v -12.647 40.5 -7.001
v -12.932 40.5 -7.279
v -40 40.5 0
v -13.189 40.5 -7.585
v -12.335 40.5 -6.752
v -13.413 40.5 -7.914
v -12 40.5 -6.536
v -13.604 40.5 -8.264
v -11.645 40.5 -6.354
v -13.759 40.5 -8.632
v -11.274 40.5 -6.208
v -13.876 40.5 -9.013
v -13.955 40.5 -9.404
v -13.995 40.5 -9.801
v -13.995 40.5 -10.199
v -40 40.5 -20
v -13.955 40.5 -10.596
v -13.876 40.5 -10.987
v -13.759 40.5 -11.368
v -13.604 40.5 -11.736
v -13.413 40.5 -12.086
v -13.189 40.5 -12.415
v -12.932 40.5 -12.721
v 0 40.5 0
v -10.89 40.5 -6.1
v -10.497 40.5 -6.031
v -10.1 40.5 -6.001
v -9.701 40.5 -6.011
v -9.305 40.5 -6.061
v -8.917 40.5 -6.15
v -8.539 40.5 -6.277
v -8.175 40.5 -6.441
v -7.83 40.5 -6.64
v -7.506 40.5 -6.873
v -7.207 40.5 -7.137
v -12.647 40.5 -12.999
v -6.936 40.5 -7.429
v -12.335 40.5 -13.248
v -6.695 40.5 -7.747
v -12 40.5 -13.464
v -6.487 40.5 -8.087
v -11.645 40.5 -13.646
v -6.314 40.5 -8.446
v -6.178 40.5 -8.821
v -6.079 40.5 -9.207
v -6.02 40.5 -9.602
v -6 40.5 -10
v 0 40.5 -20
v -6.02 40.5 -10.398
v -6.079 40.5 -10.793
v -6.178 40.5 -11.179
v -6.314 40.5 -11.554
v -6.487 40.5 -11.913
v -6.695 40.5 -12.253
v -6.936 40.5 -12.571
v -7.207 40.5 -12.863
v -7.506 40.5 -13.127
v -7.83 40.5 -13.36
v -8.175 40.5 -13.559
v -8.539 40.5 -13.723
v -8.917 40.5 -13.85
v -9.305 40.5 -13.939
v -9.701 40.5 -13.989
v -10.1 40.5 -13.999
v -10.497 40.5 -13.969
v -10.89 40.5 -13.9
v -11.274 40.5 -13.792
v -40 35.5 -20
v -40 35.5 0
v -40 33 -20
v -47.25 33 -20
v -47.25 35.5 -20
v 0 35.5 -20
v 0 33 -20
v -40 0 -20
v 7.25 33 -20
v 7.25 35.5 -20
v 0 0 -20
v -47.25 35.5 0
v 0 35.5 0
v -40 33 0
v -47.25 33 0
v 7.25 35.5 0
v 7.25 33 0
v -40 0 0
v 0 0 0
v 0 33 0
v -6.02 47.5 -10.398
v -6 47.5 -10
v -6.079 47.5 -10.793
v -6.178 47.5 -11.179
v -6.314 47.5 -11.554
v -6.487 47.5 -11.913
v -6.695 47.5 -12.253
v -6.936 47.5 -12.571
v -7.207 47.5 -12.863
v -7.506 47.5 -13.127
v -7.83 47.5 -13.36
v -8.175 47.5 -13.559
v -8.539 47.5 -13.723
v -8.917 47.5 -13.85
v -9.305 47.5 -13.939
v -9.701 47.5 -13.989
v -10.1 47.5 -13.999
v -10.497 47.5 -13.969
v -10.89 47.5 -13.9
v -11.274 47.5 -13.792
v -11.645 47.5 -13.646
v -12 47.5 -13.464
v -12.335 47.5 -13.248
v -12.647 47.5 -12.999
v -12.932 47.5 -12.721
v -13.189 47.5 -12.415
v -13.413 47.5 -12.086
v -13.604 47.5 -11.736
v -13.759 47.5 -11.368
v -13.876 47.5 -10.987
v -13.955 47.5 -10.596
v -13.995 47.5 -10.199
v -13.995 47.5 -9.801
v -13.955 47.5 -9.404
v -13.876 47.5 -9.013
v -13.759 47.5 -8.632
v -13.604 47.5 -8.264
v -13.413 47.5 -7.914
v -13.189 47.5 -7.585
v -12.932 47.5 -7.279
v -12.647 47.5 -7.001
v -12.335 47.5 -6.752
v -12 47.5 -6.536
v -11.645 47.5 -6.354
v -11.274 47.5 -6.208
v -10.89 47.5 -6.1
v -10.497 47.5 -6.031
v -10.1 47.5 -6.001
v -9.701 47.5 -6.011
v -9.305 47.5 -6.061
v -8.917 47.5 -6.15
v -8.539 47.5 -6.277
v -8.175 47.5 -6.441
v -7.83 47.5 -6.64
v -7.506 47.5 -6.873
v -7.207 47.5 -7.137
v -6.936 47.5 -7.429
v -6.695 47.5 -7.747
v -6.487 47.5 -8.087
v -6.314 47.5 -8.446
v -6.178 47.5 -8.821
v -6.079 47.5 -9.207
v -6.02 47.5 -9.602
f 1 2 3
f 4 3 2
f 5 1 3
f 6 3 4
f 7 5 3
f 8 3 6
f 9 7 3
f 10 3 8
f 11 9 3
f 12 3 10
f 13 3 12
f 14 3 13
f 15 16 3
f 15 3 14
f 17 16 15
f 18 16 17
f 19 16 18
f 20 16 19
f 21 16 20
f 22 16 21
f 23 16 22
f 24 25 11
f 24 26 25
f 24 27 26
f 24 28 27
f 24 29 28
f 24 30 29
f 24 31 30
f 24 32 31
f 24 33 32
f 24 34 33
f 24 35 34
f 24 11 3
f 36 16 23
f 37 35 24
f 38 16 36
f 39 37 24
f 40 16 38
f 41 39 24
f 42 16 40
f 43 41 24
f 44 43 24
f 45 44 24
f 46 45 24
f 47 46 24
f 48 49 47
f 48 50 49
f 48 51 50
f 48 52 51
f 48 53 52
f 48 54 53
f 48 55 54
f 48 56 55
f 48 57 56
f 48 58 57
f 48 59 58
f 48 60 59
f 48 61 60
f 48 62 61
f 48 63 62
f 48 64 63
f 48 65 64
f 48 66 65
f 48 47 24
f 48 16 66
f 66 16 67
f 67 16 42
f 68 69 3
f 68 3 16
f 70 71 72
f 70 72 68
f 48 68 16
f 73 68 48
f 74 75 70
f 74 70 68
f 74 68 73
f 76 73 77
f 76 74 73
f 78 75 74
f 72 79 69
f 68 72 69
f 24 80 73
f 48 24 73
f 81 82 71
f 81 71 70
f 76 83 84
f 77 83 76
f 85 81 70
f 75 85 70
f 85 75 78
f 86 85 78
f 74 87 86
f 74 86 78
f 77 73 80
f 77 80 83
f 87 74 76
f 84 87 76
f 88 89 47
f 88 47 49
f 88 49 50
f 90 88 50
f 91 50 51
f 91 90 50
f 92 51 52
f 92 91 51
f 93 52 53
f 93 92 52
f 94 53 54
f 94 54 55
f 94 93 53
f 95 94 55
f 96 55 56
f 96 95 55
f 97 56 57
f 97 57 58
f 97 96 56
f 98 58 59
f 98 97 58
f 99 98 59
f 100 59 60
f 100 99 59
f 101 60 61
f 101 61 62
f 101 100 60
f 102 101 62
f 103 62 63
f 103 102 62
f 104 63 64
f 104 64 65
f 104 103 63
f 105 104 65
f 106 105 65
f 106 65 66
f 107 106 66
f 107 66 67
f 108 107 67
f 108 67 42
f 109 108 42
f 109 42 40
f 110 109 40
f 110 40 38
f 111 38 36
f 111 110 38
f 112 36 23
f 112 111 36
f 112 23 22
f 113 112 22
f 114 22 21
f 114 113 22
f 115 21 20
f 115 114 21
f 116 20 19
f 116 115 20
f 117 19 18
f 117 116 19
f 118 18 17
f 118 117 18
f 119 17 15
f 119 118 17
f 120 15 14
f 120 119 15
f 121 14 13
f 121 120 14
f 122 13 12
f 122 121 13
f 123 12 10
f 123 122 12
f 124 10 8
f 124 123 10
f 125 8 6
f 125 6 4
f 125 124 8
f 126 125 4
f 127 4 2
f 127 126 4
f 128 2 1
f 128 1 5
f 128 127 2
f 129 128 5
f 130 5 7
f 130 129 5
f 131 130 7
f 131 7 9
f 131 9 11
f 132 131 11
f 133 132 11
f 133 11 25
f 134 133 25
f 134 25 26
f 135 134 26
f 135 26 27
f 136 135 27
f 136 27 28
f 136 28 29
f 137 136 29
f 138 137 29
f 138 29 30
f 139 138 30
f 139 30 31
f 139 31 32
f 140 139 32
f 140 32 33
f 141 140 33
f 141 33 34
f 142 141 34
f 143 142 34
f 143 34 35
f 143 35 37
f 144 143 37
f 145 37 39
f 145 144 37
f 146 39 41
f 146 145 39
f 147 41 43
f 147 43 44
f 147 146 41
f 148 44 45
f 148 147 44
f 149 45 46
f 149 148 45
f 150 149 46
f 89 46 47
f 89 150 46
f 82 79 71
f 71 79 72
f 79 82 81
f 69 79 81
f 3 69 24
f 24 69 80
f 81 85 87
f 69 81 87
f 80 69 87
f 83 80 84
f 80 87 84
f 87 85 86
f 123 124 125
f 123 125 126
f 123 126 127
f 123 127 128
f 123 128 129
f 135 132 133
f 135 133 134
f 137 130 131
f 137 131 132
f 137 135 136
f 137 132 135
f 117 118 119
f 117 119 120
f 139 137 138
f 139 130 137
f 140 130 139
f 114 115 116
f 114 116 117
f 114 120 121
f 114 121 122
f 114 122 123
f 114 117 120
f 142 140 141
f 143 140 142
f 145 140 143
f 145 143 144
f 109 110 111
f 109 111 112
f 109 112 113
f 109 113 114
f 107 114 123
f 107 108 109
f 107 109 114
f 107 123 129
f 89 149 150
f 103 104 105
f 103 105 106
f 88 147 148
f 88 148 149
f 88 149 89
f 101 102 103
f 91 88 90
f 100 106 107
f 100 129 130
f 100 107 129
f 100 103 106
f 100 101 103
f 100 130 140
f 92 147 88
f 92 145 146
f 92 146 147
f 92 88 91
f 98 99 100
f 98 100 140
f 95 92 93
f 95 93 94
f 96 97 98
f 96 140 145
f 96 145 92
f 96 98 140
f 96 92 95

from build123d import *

# Parameters (mm, degrees)
SKETCH1_W           = 40
SKETCH1_H           = 20
BOSS_EXTRUDE1_DEPTH = 40.5
BOSS_EXTRUDE2_START = -5
SKETCH2_W           = 7.25
SKETCH2_H           = 20
BOSS_EXTRUDE2_DEPTH = 2.5
SKETCH3_R           = 10
BOSS_EXTRUDE3_DEPTH = 7
SKETCH4_R           = 10
SKETCH4_R_2         = 4
CUT_EXTRUDE1_DEPTH  = 7


with BuildPart() as part:
    # Sketch1 → Boss-Extrude1 (new body)
    with BuildSketch(Plane(origin=(0, 0, 0), x_dir=(1, 0, 0), z_dir=(0, 1, 0))):
        with Locations((-20, 10)):
            Rectangle(SKETCH1_W, SKETCH1_H)
    extrude(amount=BOSS_EXTRUDE1_DEPTH)

    # Sketch2 → Boss-Extrude2 (add)
    with BuildSketch(Plane(origin=(0, 40.5, 0), x_dir=(1, 0, 0), z_dir=(0, 1, 0)).offset(BOSS_EXTRUDE2_START)):
        with Locations((-43.625, 10)):
            Rectangle(SKETCH2_W, SKETCH2_H)
        with Locations((3.625, 10)):
            Rectangle(SKETCH2_W, SKETCH2_H)
    extrude(amount=-BOSS_EXTRUDE2_DEPTH)

    # Sketch3 → Boss-Extrude3 (add)
    with BuildSketch(Plane(origin=(0, 40.5, 0), x_dir=(1, 0, 0), z_dir=(0, 1, 0))):
        with Locations((-10, 10)):
            Circle(SKETCH3_R)
    extrude(amount=BOSS_EXTRUDE3_DEPTH)

    # Sketch4 → Cut-Extrude1 (cut)
    with BuildSketch(Plane(origin=(0, 47.5, 0), x_dir=(1, 0, 0), z_dir=(0, 1, 0))):
        with Locations((-10, 10)):
            Circle(SKETCH4_R)
        with Locations((-10, 10)):
            Circle(SKETCH4_R_2, mode=Mode.SUBTRACT)
    extrude(amount=-CUT_EXTRUDE1_DEPTH, mode=Mode.SUBTRACT)


solid = part.part
